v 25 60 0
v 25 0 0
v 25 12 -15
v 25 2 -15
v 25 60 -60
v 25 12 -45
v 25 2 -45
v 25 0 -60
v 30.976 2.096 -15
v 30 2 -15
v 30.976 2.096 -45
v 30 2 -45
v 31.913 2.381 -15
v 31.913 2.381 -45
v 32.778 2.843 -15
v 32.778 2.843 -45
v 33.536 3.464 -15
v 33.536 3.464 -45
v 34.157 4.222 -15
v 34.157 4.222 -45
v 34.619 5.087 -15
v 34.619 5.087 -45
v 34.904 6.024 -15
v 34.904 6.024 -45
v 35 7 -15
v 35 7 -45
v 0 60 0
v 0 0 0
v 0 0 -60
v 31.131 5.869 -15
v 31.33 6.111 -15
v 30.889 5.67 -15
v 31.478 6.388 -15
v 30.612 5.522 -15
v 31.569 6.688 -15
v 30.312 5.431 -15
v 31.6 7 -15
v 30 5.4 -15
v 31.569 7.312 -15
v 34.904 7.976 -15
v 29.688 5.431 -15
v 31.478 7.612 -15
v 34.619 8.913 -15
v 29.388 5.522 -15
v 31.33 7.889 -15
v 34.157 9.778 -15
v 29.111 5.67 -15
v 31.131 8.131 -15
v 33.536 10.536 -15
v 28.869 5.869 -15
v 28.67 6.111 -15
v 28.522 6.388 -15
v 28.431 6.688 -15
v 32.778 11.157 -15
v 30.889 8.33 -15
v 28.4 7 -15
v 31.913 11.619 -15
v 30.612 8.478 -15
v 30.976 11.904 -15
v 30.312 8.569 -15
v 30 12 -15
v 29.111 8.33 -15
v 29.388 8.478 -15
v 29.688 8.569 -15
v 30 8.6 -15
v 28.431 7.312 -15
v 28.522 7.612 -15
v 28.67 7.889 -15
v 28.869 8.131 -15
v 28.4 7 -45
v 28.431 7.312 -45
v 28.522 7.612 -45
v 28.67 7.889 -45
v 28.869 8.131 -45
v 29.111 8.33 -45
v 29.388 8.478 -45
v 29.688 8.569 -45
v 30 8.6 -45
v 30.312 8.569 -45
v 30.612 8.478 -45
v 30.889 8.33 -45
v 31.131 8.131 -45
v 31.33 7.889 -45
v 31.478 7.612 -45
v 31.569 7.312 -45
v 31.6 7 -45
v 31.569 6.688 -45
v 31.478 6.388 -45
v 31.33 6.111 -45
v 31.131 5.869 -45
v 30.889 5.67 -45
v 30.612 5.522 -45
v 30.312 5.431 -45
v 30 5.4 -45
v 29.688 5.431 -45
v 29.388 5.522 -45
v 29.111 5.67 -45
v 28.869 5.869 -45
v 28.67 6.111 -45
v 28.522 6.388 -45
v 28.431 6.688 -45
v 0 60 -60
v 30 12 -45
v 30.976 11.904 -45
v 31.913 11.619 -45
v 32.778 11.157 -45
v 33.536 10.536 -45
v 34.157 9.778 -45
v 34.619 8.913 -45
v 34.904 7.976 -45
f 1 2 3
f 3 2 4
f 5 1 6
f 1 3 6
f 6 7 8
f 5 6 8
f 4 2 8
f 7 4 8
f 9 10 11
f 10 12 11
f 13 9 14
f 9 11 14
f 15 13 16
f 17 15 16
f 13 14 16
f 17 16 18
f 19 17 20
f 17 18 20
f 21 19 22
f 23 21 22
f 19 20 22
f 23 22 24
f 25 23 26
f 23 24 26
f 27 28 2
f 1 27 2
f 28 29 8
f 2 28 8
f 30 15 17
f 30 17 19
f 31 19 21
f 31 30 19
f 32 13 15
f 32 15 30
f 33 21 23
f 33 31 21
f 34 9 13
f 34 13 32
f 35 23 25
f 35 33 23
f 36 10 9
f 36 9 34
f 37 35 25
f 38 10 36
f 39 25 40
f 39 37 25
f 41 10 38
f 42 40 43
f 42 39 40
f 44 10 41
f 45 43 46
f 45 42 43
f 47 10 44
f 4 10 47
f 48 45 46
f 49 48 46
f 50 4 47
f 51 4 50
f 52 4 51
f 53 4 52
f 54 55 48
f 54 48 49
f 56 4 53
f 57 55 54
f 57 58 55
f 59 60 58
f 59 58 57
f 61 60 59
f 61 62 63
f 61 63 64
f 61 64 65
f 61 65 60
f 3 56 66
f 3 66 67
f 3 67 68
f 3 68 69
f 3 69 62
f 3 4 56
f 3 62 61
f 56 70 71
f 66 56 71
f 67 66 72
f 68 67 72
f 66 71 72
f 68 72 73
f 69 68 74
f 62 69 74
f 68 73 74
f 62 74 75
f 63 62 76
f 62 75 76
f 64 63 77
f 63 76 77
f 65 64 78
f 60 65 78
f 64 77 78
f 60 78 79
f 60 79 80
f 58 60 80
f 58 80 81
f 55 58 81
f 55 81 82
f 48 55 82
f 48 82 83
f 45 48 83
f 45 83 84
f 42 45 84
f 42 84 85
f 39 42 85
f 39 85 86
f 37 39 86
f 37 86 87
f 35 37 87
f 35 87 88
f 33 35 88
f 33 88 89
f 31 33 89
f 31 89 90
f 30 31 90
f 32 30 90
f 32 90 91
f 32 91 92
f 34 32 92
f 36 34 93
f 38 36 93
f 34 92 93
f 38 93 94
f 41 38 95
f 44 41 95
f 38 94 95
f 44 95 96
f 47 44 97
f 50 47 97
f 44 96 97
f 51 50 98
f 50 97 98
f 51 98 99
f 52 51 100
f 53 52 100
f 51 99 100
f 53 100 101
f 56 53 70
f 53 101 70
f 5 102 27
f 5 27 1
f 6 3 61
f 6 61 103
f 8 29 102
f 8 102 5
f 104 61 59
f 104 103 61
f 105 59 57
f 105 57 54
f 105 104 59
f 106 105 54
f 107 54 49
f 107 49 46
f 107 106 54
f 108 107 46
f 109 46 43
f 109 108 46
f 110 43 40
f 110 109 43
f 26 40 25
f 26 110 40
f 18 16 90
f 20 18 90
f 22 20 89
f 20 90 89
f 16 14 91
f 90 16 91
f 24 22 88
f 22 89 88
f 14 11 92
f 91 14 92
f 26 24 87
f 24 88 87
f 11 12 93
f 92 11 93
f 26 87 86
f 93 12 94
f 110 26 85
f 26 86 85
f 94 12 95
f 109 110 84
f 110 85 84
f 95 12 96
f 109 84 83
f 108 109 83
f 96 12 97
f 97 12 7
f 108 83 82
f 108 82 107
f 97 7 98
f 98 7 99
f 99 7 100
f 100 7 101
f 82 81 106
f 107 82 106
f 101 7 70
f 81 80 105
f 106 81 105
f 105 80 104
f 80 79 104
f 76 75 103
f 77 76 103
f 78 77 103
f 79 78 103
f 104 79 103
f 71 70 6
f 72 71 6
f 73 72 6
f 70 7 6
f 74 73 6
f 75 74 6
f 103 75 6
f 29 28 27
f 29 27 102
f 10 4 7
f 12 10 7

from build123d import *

# Parameters (mm, degrees)
SKETCH1_W           = 25
SKETCH1_H           = 60
BOSS_EXTRUDE1_DEPTH = 60
SKETCH2_W           = 30
SKETCH2_H           = 10
BOSS_EXTRUDE2_DEPTH = 10
SKETCH3_R           = 1.6
CUT_EXTRUDE1_DEPTH  = 83.764726786
FILLET3_R           = 5


with BuildPart() as part:
    # Sketch1 → Boss-Extrude1 (new body)
    with BuildSketch(Plane(origin=(0, 0, 0), x_dir=(1, 0, 0), z_dir=(0, 1, 0))):
        with Locations((12.5, 30)):
            Rectangle(SKETCH1_W, SKETCH1_H)
    extrude(amount=BOSS_EXTRUDE1_DEPTH)

    # Sketch2 → Boss-Extrude2 (add)
    with BuildSketch(Plane(origin=(25, 0, 0), x_dir=(0, 0, -1), z_dir=(1, 0, 0))):
        with Locations((30, 7)):
            Rectangle(SKETCH2_W, SKETCH2_H)
    extrude(amount=BOSS_EXTRUDE2_DEPTH)

    # Sketch3 → Cut-Extrude1 (cut, through all)
    with BuildSketch(Plane(origin=(0, 0, -45), x_dir=(-1, 0, 0), z_dir=(0, 0, -1))):
        with Locations((-30, 7)):
            Circle(SKETCH3_R)
    extrude(amount=-CUT_EXTRUDE1_DEPTH, mode=Mode.SUBTRACT)

    # Fillet3
    fillet3_edges = [part.edges().sort_by_distance(p)[0] for p in [
        (35, 2, -30),
        (35, 12, -30),
    ]]
    fillet(fillet3_edges, radius=FILLET3_R - 0.0001)  # a hair under: the kernel refuses the full size


solid = part.part
